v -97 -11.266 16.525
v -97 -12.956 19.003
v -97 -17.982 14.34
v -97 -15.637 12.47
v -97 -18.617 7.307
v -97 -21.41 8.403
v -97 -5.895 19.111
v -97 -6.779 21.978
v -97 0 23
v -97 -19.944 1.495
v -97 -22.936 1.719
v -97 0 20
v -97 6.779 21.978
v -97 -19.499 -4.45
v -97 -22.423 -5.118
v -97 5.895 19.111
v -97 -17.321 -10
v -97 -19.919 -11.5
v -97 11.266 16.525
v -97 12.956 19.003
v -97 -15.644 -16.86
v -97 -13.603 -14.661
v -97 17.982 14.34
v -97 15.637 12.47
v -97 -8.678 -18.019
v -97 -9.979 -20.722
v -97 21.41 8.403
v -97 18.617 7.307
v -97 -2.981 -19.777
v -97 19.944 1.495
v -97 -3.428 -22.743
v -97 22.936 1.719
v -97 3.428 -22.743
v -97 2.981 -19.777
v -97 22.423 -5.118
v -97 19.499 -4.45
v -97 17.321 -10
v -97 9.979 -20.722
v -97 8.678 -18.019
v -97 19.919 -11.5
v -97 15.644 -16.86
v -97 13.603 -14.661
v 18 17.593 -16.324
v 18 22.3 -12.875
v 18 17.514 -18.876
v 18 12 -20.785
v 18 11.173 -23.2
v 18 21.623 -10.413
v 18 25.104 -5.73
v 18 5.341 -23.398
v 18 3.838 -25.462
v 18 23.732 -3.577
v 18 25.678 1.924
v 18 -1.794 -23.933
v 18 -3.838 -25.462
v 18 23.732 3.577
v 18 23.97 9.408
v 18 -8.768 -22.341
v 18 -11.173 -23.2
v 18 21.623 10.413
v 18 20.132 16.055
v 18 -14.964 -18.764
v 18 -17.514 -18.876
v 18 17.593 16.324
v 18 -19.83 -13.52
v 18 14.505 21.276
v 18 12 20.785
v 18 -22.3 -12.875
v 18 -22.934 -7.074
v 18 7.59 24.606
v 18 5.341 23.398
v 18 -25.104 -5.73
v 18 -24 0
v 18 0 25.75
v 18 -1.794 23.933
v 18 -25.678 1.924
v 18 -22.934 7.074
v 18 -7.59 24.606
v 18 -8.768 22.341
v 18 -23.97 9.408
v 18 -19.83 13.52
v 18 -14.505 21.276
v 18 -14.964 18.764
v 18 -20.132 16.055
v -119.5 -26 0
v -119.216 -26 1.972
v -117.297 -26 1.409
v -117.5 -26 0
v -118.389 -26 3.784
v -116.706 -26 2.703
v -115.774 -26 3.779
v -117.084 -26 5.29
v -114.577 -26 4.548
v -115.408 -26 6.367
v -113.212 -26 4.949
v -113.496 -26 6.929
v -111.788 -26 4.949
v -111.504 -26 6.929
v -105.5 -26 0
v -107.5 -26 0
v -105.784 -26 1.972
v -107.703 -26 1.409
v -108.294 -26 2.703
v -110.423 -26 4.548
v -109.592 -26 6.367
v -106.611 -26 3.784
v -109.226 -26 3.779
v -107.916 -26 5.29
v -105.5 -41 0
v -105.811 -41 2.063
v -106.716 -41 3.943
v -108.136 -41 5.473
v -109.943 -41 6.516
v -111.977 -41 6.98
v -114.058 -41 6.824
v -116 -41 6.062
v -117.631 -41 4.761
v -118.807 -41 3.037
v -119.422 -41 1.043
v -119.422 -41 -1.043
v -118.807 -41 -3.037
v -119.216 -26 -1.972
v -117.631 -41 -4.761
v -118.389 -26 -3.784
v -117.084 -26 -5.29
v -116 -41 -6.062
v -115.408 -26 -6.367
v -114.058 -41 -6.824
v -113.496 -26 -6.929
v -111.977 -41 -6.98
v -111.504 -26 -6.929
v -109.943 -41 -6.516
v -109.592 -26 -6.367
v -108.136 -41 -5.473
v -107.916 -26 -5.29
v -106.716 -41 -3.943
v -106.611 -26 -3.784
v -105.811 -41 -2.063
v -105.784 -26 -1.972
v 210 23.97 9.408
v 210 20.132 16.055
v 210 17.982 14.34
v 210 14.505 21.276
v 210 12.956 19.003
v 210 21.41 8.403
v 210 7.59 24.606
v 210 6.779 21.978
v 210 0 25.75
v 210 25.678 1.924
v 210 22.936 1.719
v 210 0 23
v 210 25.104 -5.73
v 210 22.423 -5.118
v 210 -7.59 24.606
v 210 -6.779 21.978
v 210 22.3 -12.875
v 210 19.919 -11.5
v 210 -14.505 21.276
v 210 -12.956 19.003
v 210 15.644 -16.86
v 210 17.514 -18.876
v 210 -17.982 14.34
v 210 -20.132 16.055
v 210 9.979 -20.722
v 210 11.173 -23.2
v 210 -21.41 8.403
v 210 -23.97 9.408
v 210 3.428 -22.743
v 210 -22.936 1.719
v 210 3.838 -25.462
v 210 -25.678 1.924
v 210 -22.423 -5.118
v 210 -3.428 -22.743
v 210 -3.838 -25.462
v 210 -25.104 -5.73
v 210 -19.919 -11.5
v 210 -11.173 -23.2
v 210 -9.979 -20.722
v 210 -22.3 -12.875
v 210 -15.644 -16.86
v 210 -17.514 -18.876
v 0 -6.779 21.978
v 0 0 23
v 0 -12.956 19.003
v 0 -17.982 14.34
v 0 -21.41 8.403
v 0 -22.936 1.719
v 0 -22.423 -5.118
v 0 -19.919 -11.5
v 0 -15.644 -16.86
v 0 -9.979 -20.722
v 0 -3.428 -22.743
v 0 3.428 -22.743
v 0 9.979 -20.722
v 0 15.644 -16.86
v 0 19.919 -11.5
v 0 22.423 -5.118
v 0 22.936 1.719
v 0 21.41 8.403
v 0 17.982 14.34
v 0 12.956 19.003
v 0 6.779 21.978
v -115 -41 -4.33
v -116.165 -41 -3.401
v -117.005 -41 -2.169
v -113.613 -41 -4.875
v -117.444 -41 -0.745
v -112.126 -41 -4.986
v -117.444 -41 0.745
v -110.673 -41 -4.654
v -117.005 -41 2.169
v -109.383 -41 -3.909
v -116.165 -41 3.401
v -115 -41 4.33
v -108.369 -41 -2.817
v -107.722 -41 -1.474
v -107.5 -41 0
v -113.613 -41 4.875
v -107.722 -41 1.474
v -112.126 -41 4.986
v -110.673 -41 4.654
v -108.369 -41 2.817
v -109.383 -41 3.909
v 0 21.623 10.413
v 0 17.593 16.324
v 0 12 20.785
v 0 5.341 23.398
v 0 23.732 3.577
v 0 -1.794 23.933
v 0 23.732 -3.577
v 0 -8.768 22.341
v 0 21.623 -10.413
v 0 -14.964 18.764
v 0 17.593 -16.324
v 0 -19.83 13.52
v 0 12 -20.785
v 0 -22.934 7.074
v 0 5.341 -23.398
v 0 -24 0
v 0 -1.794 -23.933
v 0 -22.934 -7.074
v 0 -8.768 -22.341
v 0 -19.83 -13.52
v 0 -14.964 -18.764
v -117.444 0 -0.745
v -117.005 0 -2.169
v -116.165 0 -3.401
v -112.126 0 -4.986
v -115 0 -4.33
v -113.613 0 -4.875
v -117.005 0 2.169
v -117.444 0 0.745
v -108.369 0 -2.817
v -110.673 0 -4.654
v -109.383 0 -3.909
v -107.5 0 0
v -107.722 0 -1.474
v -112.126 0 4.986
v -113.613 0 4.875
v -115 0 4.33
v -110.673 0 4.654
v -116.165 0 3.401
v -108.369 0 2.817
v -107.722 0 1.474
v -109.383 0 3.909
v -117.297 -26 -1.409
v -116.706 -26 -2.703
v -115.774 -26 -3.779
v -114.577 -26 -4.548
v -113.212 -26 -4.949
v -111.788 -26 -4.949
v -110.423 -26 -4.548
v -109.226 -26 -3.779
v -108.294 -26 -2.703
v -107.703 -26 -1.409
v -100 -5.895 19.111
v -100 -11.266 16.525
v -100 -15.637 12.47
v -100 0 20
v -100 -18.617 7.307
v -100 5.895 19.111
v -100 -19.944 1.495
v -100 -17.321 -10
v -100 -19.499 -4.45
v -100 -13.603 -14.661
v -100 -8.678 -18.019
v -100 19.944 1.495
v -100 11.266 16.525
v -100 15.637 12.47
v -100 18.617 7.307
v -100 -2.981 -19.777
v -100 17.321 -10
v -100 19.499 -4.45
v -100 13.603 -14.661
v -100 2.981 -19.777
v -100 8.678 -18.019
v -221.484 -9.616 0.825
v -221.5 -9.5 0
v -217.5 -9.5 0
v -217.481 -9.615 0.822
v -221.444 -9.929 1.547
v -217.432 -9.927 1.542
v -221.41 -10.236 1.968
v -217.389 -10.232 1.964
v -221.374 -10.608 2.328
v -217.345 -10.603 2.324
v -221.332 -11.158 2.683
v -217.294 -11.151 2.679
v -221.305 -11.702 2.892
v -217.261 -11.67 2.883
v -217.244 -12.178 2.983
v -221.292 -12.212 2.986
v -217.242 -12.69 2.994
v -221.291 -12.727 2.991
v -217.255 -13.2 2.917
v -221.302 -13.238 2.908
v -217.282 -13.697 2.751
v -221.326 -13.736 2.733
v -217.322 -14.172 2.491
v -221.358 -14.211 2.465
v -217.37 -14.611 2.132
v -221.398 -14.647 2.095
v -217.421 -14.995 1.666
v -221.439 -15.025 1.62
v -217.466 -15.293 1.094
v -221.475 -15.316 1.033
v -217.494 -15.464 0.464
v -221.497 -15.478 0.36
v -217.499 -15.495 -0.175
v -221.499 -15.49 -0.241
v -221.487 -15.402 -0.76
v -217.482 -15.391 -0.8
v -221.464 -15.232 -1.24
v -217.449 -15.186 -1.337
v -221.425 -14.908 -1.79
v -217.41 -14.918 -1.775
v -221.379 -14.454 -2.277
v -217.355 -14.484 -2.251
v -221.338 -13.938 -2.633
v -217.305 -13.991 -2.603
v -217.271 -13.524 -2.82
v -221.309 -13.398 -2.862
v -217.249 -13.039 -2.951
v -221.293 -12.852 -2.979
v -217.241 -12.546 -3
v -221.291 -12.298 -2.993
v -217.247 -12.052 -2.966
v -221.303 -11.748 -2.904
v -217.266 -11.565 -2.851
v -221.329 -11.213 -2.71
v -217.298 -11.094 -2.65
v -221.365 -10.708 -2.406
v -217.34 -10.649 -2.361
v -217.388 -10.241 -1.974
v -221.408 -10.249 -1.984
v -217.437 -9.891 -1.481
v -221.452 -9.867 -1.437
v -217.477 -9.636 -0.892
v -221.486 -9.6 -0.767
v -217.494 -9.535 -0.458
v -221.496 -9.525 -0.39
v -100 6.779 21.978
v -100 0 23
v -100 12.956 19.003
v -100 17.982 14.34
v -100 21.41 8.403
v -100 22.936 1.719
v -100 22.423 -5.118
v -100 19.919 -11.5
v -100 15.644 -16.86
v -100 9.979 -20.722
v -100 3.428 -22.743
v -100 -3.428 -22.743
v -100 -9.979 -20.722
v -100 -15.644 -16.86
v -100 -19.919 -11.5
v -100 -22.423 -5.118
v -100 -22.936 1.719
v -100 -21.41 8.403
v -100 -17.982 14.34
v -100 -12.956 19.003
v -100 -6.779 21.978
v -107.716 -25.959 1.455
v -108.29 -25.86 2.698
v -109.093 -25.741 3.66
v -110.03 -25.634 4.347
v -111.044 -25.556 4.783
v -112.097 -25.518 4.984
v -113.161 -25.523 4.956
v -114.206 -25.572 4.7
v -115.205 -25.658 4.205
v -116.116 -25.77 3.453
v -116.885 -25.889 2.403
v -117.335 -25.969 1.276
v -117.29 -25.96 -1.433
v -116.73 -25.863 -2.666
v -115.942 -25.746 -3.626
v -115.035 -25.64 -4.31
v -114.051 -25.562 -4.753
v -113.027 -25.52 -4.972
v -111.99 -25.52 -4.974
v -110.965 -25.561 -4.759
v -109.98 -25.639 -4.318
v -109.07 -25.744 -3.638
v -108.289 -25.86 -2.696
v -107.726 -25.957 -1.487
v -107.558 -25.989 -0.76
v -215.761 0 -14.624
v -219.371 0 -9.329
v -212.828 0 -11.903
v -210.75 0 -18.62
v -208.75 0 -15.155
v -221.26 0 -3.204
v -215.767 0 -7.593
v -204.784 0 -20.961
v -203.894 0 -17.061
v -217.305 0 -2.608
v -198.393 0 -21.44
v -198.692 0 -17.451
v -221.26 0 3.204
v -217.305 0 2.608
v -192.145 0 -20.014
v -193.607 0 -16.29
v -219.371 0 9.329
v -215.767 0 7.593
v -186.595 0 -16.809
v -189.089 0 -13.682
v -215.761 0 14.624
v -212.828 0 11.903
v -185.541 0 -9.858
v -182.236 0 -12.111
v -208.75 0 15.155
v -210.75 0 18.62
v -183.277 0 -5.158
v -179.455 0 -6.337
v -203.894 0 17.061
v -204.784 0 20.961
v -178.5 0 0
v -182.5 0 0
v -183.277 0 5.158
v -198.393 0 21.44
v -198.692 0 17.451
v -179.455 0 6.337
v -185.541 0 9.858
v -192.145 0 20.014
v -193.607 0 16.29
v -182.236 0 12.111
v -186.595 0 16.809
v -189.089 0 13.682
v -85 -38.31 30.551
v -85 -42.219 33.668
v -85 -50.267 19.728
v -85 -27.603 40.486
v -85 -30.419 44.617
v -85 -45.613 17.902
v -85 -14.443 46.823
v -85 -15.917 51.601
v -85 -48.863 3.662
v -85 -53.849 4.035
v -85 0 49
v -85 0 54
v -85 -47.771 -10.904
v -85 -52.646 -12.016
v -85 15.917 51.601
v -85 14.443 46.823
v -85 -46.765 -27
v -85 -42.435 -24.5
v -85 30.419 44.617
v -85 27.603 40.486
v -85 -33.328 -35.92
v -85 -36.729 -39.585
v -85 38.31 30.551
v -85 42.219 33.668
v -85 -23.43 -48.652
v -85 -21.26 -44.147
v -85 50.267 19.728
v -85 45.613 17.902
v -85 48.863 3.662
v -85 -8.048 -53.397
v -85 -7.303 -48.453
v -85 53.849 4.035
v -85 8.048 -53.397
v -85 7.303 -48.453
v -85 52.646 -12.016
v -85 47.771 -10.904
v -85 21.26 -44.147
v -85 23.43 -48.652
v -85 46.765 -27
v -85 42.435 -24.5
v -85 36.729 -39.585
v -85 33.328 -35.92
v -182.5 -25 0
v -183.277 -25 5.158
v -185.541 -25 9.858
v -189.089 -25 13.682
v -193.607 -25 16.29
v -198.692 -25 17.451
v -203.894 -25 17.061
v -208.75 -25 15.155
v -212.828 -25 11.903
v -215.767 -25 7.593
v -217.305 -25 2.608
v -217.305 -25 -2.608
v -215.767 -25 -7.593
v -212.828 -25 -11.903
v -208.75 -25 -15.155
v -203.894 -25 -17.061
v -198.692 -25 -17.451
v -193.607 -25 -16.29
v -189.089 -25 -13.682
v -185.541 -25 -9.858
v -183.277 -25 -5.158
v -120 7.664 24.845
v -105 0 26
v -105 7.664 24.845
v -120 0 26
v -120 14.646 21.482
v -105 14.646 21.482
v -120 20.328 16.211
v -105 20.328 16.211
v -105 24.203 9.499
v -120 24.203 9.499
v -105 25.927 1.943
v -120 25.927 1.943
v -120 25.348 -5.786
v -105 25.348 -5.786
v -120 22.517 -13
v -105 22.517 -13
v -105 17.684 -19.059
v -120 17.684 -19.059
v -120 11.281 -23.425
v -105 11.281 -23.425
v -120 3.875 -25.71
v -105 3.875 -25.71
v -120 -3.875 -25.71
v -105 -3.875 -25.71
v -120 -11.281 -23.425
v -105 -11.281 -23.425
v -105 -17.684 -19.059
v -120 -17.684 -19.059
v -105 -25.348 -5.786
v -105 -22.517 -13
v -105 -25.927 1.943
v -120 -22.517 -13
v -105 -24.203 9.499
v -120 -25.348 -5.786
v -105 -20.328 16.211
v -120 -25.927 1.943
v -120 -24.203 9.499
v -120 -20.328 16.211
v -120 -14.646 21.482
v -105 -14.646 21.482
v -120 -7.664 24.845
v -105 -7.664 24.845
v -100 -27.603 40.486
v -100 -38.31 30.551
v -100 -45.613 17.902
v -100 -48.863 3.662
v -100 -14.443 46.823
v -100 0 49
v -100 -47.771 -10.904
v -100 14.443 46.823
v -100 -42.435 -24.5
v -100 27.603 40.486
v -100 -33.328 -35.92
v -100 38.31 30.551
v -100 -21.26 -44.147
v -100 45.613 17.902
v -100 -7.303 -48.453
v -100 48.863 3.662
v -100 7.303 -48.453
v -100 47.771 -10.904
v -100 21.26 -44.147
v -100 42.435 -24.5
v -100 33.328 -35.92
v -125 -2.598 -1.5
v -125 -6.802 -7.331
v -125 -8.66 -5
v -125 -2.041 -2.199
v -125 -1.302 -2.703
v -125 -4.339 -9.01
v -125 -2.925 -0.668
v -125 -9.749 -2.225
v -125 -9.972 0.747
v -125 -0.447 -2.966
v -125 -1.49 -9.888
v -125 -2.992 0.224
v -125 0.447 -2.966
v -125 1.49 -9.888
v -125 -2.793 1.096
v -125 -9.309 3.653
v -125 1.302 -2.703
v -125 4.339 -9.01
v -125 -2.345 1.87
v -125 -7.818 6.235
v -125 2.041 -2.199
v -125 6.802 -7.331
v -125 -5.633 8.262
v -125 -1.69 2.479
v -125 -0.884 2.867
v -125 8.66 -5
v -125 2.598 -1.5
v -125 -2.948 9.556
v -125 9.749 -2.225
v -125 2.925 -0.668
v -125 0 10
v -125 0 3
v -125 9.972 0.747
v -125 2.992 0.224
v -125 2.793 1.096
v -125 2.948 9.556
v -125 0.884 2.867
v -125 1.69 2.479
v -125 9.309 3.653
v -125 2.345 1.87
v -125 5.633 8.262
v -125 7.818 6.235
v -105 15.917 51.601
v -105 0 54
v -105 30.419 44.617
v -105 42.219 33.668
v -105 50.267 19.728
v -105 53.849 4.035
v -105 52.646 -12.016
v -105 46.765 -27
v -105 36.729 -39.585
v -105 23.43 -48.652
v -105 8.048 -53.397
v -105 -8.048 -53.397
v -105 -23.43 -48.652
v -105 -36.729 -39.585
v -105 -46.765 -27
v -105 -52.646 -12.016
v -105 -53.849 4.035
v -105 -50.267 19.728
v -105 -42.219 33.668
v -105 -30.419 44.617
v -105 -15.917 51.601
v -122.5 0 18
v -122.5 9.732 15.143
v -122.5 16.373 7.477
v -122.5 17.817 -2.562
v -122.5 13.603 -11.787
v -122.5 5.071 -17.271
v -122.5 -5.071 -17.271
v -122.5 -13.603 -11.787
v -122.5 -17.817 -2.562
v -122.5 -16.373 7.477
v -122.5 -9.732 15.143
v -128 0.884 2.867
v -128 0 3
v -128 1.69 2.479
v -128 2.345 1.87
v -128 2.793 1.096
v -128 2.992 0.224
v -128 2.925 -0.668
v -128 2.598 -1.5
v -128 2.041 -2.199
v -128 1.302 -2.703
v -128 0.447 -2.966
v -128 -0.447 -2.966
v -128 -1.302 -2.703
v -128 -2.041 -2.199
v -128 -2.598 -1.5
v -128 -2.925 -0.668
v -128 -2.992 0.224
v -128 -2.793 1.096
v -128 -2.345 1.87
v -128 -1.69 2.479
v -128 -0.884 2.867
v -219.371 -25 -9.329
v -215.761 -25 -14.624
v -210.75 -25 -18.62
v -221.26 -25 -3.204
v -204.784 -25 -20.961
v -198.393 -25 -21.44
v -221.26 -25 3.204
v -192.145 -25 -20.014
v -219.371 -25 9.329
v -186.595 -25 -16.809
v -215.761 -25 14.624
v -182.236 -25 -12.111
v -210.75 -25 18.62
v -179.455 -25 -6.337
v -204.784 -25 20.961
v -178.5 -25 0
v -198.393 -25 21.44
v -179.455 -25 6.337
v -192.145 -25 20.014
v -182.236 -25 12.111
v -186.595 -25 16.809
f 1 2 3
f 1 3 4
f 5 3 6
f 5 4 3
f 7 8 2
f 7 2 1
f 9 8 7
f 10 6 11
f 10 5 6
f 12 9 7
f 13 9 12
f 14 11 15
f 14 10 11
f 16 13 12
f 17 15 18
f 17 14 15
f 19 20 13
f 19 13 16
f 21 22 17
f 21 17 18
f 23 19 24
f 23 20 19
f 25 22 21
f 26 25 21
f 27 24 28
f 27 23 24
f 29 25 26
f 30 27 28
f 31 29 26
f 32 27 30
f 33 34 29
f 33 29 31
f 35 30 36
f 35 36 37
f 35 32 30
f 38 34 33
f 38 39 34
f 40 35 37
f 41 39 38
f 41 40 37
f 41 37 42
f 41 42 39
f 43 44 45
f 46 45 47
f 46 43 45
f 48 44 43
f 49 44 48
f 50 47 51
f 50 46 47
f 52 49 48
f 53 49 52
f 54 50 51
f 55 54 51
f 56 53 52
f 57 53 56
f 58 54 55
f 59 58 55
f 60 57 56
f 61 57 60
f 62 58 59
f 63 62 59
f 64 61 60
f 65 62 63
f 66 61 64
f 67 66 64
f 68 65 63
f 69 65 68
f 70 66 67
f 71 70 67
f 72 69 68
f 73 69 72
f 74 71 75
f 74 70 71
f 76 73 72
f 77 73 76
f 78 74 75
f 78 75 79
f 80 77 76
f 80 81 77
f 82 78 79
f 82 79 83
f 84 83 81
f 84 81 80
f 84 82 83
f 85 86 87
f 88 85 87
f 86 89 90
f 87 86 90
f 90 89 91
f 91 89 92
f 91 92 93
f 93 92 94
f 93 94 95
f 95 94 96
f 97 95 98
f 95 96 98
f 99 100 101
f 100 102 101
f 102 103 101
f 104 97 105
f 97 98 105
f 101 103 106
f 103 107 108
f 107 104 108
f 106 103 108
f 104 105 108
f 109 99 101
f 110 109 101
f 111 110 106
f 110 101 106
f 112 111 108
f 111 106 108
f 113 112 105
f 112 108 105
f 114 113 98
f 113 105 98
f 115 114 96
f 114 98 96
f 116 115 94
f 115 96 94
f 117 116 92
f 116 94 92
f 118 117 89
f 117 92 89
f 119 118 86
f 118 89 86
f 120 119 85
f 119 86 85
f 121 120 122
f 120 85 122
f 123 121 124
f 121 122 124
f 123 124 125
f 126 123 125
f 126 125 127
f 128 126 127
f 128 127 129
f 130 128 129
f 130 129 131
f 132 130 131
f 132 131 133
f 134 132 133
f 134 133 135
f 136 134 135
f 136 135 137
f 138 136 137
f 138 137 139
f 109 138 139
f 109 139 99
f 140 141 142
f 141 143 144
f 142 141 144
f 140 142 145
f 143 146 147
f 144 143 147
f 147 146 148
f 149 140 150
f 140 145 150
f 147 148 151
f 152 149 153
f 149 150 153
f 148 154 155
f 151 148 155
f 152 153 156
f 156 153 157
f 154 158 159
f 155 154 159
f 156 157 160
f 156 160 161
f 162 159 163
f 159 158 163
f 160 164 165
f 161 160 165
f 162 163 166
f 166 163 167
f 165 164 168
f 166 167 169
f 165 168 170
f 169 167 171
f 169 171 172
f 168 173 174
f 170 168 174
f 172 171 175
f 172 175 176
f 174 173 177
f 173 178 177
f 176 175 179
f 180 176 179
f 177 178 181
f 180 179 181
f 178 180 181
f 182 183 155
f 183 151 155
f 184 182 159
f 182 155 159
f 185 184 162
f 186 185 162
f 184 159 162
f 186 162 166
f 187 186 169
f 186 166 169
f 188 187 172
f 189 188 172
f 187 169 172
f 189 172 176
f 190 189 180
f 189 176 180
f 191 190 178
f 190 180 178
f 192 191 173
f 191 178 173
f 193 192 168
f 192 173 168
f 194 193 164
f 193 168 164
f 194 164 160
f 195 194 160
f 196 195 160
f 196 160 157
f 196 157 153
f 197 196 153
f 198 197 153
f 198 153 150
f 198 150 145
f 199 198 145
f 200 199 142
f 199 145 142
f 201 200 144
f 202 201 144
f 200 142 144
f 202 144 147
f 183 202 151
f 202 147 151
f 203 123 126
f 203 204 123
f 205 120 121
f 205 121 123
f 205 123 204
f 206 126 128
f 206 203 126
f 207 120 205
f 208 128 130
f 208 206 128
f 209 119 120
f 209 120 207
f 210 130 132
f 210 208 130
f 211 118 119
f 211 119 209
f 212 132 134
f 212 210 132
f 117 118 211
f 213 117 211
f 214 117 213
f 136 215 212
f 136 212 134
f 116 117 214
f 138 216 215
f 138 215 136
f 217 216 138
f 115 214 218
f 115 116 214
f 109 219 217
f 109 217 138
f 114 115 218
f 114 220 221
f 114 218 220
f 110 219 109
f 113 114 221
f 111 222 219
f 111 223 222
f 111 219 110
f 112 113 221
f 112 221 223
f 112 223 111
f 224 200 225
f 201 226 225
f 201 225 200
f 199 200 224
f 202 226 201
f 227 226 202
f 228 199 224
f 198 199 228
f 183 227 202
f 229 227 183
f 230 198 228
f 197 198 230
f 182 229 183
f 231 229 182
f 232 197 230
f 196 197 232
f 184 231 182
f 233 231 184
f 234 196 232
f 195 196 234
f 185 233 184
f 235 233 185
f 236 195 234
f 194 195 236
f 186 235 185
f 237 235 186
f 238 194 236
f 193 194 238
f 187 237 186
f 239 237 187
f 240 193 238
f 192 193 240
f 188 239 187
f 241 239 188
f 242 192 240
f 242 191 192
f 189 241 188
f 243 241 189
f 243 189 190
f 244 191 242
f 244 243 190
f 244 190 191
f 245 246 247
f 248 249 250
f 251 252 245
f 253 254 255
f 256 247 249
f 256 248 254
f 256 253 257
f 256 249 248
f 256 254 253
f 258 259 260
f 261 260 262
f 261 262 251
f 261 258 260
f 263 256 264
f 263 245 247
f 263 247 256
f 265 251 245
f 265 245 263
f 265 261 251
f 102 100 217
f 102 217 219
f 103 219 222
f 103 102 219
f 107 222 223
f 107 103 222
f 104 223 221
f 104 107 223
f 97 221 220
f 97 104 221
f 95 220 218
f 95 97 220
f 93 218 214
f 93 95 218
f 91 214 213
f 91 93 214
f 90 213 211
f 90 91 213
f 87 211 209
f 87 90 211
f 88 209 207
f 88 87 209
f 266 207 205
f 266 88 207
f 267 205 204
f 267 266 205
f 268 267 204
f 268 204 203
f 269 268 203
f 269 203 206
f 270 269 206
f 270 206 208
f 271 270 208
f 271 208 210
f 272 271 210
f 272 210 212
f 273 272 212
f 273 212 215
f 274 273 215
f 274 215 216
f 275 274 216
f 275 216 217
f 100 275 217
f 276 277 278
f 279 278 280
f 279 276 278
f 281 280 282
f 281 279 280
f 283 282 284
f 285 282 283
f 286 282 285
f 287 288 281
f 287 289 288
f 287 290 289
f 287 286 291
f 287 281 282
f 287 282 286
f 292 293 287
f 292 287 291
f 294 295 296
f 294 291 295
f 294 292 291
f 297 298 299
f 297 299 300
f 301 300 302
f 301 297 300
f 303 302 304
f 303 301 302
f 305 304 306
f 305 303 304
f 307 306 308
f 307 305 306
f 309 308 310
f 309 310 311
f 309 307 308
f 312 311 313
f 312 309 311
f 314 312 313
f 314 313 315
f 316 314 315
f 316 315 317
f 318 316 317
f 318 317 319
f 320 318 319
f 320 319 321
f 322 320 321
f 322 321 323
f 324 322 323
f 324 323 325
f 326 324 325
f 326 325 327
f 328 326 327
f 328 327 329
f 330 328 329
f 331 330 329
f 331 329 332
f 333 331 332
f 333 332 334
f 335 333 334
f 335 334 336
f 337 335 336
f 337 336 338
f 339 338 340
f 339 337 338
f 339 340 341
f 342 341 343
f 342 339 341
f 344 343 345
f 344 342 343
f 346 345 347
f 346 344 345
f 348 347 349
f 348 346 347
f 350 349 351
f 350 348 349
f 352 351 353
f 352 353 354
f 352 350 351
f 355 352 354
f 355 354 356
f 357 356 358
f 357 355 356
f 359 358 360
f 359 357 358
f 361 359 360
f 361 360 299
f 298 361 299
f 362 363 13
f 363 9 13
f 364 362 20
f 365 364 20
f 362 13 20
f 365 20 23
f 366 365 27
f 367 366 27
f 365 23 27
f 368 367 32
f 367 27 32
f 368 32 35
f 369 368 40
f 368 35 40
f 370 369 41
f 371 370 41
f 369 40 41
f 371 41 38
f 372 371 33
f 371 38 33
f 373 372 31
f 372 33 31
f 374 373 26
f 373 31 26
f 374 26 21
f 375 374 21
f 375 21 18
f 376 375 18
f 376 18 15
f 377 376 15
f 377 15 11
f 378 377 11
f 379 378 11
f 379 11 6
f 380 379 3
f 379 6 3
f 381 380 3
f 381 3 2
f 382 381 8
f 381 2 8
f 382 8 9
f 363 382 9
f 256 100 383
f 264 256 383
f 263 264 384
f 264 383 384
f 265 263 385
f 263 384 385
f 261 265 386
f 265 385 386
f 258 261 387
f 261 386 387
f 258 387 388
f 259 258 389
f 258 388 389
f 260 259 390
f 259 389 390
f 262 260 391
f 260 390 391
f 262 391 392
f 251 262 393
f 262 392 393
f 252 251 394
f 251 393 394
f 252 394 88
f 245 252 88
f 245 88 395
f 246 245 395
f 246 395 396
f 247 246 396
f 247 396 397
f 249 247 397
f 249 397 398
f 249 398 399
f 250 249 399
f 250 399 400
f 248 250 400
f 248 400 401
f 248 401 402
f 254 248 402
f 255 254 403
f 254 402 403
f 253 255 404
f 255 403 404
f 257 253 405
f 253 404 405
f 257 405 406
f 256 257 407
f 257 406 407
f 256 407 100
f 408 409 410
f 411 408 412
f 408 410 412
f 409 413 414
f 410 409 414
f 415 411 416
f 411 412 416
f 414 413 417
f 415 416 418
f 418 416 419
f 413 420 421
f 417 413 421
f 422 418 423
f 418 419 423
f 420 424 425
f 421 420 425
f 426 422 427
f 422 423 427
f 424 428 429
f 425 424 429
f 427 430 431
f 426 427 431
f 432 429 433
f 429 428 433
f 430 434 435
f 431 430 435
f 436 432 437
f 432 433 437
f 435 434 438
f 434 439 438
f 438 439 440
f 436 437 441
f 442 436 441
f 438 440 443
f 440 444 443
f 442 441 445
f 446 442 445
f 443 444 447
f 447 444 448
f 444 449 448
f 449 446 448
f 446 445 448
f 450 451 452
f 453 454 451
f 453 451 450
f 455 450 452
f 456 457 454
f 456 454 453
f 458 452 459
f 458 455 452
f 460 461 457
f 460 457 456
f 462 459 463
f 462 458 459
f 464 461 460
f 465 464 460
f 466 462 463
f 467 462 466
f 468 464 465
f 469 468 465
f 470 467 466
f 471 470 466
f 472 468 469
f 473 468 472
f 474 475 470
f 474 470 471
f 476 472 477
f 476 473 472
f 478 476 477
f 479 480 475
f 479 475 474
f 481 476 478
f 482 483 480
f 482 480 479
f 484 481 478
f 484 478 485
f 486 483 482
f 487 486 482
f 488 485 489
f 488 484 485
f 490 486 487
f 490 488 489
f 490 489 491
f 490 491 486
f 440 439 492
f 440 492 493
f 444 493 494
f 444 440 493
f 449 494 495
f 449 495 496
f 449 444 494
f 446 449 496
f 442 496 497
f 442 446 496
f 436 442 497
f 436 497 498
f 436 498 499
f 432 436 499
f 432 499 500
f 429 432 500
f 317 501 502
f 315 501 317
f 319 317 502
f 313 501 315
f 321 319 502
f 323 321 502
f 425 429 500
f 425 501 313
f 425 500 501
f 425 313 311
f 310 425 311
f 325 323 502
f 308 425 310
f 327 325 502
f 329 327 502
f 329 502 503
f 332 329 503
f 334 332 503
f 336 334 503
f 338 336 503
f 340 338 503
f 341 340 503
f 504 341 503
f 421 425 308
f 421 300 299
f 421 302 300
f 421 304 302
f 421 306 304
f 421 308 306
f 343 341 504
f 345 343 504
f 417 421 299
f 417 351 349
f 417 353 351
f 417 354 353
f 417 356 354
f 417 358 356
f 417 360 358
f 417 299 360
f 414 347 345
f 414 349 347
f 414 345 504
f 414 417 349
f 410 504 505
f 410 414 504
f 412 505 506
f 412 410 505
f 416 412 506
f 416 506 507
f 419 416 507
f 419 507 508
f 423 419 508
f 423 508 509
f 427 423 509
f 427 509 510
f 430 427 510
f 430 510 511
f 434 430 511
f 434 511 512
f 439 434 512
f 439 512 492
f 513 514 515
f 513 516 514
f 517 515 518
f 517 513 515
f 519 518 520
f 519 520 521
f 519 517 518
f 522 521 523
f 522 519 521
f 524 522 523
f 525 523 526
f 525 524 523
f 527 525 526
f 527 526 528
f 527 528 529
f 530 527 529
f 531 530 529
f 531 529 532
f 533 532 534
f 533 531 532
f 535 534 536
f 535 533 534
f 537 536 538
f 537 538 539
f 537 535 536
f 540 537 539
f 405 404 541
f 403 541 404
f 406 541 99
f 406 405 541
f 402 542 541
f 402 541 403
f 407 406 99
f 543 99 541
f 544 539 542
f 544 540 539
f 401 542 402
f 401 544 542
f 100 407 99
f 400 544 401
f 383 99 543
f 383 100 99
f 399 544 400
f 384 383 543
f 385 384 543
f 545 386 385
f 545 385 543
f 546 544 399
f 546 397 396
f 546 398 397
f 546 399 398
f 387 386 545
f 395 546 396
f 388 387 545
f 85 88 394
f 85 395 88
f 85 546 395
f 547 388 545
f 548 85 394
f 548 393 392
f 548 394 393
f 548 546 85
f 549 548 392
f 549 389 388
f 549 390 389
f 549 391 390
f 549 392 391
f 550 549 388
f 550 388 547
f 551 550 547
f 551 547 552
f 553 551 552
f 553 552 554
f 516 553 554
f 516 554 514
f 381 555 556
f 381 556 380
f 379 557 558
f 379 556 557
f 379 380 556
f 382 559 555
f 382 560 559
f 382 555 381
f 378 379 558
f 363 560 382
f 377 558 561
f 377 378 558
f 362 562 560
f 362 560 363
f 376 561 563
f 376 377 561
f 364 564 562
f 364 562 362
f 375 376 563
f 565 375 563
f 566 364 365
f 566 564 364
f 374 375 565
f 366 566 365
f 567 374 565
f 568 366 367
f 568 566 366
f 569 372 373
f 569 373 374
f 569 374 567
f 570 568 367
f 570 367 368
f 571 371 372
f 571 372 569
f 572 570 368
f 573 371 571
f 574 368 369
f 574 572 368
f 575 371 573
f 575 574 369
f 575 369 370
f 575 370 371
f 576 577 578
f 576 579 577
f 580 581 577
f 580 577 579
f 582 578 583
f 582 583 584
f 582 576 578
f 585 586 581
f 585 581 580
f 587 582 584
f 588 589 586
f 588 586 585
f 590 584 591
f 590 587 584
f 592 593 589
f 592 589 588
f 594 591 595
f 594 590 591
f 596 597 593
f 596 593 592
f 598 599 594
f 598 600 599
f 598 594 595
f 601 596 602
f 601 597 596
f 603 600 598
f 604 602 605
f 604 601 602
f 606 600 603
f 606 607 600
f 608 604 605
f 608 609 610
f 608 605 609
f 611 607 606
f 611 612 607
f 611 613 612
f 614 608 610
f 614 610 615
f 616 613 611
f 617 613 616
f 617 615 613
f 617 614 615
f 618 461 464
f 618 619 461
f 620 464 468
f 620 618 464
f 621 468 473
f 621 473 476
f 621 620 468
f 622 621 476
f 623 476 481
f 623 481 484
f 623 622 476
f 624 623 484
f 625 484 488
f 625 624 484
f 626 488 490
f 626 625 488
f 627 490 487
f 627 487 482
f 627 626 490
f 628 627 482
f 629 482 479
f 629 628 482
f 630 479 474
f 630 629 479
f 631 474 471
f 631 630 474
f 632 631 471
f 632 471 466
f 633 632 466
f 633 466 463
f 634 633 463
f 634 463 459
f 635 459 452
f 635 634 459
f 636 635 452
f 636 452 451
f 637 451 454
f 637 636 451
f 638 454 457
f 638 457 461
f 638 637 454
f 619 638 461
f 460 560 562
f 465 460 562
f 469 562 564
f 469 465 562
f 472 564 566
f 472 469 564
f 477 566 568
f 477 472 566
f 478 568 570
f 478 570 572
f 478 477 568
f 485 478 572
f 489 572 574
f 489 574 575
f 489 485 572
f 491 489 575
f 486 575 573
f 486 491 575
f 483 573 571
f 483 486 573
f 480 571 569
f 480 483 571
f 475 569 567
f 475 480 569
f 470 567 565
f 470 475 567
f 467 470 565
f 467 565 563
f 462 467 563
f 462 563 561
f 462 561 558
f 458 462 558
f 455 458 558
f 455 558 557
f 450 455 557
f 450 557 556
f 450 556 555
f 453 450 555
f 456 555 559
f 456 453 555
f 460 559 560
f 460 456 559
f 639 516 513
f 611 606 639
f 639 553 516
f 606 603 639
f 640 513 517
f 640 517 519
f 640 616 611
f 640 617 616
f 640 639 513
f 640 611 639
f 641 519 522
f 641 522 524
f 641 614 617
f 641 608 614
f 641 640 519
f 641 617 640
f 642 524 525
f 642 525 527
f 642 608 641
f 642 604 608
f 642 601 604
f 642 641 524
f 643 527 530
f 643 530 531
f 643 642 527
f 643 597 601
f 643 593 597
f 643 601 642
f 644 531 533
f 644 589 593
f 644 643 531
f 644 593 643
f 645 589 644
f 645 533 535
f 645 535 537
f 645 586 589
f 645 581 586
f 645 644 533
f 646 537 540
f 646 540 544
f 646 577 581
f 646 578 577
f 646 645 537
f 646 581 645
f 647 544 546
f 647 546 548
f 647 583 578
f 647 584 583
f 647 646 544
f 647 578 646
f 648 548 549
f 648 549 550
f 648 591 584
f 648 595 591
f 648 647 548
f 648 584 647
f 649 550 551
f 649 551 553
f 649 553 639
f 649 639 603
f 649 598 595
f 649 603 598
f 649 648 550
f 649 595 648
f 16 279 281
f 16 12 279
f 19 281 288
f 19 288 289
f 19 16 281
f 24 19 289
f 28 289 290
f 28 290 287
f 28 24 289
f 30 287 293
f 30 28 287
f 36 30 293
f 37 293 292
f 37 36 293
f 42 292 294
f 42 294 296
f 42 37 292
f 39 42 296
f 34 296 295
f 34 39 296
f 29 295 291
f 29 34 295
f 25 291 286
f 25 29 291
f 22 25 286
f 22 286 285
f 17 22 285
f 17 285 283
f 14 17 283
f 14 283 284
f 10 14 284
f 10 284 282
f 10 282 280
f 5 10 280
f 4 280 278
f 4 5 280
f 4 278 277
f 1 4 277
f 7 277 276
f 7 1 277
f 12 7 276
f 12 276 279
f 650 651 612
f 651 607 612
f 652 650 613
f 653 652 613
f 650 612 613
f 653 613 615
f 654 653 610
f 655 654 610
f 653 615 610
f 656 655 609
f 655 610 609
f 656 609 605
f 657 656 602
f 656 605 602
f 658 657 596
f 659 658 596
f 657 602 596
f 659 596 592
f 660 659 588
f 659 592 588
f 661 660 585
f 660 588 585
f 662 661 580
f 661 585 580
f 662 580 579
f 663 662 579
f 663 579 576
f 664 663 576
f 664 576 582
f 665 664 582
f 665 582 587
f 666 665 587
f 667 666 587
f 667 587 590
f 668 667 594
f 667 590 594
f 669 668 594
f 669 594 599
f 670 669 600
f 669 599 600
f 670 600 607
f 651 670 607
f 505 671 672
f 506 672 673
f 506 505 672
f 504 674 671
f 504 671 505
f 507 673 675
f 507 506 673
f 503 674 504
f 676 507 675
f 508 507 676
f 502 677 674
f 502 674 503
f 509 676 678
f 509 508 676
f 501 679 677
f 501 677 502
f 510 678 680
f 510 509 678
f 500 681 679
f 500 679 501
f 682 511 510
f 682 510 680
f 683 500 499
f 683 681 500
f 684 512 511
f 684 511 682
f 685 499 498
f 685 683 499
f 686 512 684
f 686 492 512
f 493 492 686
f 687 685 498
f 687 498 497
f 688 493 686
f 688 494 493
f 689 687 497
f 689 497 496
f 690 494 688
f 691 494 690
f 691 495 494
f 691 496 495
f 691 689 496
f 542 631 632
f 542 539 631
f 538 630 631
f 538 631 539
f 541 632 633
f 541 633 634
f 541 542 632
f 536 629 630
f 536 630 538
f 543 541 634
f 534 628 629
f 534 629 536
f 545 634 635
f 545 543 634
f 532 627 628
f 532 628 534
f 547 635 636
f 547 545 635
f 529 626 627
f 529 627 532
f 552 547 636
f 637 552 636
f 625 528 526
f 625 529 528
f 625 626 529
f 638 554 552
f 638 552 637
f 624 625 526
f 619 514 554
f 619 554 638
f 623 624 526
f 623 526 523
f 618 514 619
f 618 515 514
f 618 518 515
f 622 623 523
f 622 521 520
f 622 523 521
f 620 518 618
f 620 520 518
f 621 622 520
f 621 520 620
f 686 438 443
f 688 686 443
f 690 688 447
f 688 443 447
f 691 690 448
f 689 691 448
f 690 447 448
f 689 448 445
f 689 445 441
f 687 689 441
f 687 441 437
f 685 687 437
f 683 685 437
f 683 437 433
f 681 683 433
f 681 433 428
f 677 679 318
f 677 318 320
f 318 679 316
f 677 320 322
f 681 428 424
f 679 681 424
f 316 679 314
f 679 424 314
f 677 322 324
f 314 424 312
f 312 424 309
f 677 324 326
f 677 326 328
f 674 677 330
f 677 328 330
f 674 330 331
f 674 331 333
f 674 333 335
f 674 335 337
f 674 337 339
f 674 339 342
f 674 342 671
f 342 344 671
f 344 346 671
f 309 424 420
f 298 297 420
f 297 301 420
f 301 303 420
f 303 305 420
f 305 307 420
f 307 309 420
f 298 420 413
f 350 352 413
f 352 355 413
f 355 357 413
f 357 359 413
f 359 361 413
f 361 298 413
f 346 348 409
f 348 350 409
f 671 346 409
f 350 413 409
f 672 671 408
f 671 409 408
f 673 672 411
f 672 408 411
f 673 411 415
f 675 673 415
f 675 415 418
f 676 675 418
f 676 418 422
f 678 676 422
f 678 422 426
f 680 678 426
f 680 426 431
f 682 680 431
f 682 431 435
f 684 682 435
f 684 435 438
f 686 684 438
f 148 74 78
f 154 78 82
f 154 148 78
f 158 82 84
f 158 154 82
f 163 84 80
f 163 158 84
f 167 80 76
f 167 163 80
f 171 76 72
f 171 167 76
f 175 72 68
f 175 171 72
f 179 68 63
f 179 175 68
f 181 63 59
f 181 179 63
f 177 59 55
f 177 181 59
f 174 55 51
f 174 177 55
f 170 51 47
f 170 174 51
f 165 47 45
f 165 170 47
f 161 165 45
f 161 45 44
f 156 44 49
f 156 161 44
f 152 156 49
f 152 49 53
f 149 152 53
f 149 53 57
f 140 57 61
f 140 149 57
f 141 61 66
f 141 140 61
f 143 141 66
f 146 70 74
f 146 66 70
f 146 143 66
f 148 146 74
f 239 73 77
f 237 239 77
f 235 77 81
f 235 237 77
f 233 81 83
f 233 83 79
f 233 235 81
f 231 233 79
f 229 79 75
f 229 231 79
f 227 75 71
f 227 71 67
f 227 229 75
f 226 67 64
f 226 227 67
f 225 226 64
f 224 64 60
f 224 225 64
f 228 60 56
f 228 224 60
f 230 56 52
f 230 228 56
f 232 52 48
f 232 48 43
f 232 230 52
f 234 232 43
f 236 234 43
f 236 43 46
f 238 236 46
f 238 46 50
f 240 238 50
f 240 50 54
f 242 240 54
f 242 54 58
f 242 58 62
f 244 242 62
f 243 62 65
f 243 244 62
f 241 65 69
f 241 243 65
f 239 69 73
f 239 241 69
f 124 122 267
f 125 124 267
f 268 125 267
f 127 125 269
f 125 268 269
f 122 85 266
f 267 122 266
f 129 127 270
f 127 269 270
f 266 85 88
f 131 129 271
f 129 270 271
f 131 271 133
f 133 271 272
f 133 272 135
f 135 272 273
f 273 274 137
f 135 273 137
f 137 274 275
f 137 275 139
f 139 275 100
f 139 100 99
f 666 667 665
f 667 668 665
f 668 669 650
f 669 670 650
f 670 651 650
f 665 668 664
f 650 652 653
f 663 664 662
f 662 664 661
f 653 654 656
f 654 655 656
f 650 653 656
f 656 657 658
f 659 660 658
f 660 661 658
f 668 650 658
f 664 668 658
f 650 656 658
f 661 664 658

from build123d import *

# Parameters (mm, degrees)
F0_W      = 210
F0_H      = 2.75
F2_R      = 25.75
F2_R_2    = 24
F3_DEPTH  = 18
F4_W      = 3
F4_H      = 3
F7_R      = 7
F7_R_2    = 5
F8_DEPTH  = 15
F9_R      = 5
F10_DEPTH = 26
F11_R     = 21.5
F11_R_2   = 17.5
F12_DEPTH = 25
F14_R     = 3
F15_DEPTH = 6


with BuildPart() as f1:
    # F0 (on Front) → F1 (revolve)
    with BuildSketch(Plane.XZ):
        with Locations((105, 24.375)):
            Rectangle(F0_W, F0_H)
    revolve(axis=Axis((50, 0, 0), (1, 0, 0)))

    # F2 (on face) → F3 (cut)
    with BuildSketch(Plane(origin=(0, 0, 0), x_dir=(0, -1, 0), z_dir=(-1, 0, 0))):
        Circle(F2_R)
        Circle(F2_R_2, mode=Mode.SUBTRACT)
    extrude(amount=-F3_DEPTH, mode=Mode.SUBTRACT)


with BuildPart() as f5:
    # F4 (on Front) → F5 (revolve)
    with BuildSketch(Plane.XZ):
        Polygon((-125, 0), (-100, 0), (-100, 20), (-100, 23), (-100, 26), (-105, 26), (-120, 26), (-125, 10), (-125, 3), align=None)
        with Locations((-98.5, 21.5)):
            Rectangle(F4_W, F4_H)
        with Locations((-126.5, 1.5)):
            Rectangle(F4_W, F4_H)
        Polygon((-105, 26), (-100, 26), (-100, 49), (-85, 49), (-85, 54), (-105, 54), align=None)
    revolve(axis=Axis((-112.5, 0, 0), (-1, 0, 0)))

    # F7 (on offset) → F8 (join)
    with BuildSketch(Plane.XZ.offset(26)):
        with Locations((-112.5, 0)):
            Circle(F7_R)
        with Locations((-112.5, 0)):
            Circle(F7_R_2, mode=Mode.SUBTRACT)
    extrude(amount=F8_DEPTH)

    # F9 (on offset) → F10 (cut)
    with BuildSketch(Plane.XZ.offset(26)):
        with Locations((-112.5, 0)):
            Circle(F9_R)
    extrude(amount=-F10_DEPTH, mode=Mode.SUBTRACT)


with BuildPart() as f12:
    # F11 (on Front) → F12 (new body)
    with BuildSketch(Plane.XZ):
        with Locations((-200, 0)):
            Circle(F11_R)
        with Locations((-200, 0)):
            Circle(F11_R_2, mode=Mode.SUBTRACT)
    extrude(amount=F12_DEPTH)

    # F14 (on offset) → F15 (cut)
    with BuildSketch(Plane.YZ.offset(-221.5)):
        with Locations((-12.5, 0)):
            Circle(F14_R)
    extrude(amount=F15_DEPTH, mode=Mode.SUBTRACT)


solid = Compound([f1.part, f5.part, f12.part])
